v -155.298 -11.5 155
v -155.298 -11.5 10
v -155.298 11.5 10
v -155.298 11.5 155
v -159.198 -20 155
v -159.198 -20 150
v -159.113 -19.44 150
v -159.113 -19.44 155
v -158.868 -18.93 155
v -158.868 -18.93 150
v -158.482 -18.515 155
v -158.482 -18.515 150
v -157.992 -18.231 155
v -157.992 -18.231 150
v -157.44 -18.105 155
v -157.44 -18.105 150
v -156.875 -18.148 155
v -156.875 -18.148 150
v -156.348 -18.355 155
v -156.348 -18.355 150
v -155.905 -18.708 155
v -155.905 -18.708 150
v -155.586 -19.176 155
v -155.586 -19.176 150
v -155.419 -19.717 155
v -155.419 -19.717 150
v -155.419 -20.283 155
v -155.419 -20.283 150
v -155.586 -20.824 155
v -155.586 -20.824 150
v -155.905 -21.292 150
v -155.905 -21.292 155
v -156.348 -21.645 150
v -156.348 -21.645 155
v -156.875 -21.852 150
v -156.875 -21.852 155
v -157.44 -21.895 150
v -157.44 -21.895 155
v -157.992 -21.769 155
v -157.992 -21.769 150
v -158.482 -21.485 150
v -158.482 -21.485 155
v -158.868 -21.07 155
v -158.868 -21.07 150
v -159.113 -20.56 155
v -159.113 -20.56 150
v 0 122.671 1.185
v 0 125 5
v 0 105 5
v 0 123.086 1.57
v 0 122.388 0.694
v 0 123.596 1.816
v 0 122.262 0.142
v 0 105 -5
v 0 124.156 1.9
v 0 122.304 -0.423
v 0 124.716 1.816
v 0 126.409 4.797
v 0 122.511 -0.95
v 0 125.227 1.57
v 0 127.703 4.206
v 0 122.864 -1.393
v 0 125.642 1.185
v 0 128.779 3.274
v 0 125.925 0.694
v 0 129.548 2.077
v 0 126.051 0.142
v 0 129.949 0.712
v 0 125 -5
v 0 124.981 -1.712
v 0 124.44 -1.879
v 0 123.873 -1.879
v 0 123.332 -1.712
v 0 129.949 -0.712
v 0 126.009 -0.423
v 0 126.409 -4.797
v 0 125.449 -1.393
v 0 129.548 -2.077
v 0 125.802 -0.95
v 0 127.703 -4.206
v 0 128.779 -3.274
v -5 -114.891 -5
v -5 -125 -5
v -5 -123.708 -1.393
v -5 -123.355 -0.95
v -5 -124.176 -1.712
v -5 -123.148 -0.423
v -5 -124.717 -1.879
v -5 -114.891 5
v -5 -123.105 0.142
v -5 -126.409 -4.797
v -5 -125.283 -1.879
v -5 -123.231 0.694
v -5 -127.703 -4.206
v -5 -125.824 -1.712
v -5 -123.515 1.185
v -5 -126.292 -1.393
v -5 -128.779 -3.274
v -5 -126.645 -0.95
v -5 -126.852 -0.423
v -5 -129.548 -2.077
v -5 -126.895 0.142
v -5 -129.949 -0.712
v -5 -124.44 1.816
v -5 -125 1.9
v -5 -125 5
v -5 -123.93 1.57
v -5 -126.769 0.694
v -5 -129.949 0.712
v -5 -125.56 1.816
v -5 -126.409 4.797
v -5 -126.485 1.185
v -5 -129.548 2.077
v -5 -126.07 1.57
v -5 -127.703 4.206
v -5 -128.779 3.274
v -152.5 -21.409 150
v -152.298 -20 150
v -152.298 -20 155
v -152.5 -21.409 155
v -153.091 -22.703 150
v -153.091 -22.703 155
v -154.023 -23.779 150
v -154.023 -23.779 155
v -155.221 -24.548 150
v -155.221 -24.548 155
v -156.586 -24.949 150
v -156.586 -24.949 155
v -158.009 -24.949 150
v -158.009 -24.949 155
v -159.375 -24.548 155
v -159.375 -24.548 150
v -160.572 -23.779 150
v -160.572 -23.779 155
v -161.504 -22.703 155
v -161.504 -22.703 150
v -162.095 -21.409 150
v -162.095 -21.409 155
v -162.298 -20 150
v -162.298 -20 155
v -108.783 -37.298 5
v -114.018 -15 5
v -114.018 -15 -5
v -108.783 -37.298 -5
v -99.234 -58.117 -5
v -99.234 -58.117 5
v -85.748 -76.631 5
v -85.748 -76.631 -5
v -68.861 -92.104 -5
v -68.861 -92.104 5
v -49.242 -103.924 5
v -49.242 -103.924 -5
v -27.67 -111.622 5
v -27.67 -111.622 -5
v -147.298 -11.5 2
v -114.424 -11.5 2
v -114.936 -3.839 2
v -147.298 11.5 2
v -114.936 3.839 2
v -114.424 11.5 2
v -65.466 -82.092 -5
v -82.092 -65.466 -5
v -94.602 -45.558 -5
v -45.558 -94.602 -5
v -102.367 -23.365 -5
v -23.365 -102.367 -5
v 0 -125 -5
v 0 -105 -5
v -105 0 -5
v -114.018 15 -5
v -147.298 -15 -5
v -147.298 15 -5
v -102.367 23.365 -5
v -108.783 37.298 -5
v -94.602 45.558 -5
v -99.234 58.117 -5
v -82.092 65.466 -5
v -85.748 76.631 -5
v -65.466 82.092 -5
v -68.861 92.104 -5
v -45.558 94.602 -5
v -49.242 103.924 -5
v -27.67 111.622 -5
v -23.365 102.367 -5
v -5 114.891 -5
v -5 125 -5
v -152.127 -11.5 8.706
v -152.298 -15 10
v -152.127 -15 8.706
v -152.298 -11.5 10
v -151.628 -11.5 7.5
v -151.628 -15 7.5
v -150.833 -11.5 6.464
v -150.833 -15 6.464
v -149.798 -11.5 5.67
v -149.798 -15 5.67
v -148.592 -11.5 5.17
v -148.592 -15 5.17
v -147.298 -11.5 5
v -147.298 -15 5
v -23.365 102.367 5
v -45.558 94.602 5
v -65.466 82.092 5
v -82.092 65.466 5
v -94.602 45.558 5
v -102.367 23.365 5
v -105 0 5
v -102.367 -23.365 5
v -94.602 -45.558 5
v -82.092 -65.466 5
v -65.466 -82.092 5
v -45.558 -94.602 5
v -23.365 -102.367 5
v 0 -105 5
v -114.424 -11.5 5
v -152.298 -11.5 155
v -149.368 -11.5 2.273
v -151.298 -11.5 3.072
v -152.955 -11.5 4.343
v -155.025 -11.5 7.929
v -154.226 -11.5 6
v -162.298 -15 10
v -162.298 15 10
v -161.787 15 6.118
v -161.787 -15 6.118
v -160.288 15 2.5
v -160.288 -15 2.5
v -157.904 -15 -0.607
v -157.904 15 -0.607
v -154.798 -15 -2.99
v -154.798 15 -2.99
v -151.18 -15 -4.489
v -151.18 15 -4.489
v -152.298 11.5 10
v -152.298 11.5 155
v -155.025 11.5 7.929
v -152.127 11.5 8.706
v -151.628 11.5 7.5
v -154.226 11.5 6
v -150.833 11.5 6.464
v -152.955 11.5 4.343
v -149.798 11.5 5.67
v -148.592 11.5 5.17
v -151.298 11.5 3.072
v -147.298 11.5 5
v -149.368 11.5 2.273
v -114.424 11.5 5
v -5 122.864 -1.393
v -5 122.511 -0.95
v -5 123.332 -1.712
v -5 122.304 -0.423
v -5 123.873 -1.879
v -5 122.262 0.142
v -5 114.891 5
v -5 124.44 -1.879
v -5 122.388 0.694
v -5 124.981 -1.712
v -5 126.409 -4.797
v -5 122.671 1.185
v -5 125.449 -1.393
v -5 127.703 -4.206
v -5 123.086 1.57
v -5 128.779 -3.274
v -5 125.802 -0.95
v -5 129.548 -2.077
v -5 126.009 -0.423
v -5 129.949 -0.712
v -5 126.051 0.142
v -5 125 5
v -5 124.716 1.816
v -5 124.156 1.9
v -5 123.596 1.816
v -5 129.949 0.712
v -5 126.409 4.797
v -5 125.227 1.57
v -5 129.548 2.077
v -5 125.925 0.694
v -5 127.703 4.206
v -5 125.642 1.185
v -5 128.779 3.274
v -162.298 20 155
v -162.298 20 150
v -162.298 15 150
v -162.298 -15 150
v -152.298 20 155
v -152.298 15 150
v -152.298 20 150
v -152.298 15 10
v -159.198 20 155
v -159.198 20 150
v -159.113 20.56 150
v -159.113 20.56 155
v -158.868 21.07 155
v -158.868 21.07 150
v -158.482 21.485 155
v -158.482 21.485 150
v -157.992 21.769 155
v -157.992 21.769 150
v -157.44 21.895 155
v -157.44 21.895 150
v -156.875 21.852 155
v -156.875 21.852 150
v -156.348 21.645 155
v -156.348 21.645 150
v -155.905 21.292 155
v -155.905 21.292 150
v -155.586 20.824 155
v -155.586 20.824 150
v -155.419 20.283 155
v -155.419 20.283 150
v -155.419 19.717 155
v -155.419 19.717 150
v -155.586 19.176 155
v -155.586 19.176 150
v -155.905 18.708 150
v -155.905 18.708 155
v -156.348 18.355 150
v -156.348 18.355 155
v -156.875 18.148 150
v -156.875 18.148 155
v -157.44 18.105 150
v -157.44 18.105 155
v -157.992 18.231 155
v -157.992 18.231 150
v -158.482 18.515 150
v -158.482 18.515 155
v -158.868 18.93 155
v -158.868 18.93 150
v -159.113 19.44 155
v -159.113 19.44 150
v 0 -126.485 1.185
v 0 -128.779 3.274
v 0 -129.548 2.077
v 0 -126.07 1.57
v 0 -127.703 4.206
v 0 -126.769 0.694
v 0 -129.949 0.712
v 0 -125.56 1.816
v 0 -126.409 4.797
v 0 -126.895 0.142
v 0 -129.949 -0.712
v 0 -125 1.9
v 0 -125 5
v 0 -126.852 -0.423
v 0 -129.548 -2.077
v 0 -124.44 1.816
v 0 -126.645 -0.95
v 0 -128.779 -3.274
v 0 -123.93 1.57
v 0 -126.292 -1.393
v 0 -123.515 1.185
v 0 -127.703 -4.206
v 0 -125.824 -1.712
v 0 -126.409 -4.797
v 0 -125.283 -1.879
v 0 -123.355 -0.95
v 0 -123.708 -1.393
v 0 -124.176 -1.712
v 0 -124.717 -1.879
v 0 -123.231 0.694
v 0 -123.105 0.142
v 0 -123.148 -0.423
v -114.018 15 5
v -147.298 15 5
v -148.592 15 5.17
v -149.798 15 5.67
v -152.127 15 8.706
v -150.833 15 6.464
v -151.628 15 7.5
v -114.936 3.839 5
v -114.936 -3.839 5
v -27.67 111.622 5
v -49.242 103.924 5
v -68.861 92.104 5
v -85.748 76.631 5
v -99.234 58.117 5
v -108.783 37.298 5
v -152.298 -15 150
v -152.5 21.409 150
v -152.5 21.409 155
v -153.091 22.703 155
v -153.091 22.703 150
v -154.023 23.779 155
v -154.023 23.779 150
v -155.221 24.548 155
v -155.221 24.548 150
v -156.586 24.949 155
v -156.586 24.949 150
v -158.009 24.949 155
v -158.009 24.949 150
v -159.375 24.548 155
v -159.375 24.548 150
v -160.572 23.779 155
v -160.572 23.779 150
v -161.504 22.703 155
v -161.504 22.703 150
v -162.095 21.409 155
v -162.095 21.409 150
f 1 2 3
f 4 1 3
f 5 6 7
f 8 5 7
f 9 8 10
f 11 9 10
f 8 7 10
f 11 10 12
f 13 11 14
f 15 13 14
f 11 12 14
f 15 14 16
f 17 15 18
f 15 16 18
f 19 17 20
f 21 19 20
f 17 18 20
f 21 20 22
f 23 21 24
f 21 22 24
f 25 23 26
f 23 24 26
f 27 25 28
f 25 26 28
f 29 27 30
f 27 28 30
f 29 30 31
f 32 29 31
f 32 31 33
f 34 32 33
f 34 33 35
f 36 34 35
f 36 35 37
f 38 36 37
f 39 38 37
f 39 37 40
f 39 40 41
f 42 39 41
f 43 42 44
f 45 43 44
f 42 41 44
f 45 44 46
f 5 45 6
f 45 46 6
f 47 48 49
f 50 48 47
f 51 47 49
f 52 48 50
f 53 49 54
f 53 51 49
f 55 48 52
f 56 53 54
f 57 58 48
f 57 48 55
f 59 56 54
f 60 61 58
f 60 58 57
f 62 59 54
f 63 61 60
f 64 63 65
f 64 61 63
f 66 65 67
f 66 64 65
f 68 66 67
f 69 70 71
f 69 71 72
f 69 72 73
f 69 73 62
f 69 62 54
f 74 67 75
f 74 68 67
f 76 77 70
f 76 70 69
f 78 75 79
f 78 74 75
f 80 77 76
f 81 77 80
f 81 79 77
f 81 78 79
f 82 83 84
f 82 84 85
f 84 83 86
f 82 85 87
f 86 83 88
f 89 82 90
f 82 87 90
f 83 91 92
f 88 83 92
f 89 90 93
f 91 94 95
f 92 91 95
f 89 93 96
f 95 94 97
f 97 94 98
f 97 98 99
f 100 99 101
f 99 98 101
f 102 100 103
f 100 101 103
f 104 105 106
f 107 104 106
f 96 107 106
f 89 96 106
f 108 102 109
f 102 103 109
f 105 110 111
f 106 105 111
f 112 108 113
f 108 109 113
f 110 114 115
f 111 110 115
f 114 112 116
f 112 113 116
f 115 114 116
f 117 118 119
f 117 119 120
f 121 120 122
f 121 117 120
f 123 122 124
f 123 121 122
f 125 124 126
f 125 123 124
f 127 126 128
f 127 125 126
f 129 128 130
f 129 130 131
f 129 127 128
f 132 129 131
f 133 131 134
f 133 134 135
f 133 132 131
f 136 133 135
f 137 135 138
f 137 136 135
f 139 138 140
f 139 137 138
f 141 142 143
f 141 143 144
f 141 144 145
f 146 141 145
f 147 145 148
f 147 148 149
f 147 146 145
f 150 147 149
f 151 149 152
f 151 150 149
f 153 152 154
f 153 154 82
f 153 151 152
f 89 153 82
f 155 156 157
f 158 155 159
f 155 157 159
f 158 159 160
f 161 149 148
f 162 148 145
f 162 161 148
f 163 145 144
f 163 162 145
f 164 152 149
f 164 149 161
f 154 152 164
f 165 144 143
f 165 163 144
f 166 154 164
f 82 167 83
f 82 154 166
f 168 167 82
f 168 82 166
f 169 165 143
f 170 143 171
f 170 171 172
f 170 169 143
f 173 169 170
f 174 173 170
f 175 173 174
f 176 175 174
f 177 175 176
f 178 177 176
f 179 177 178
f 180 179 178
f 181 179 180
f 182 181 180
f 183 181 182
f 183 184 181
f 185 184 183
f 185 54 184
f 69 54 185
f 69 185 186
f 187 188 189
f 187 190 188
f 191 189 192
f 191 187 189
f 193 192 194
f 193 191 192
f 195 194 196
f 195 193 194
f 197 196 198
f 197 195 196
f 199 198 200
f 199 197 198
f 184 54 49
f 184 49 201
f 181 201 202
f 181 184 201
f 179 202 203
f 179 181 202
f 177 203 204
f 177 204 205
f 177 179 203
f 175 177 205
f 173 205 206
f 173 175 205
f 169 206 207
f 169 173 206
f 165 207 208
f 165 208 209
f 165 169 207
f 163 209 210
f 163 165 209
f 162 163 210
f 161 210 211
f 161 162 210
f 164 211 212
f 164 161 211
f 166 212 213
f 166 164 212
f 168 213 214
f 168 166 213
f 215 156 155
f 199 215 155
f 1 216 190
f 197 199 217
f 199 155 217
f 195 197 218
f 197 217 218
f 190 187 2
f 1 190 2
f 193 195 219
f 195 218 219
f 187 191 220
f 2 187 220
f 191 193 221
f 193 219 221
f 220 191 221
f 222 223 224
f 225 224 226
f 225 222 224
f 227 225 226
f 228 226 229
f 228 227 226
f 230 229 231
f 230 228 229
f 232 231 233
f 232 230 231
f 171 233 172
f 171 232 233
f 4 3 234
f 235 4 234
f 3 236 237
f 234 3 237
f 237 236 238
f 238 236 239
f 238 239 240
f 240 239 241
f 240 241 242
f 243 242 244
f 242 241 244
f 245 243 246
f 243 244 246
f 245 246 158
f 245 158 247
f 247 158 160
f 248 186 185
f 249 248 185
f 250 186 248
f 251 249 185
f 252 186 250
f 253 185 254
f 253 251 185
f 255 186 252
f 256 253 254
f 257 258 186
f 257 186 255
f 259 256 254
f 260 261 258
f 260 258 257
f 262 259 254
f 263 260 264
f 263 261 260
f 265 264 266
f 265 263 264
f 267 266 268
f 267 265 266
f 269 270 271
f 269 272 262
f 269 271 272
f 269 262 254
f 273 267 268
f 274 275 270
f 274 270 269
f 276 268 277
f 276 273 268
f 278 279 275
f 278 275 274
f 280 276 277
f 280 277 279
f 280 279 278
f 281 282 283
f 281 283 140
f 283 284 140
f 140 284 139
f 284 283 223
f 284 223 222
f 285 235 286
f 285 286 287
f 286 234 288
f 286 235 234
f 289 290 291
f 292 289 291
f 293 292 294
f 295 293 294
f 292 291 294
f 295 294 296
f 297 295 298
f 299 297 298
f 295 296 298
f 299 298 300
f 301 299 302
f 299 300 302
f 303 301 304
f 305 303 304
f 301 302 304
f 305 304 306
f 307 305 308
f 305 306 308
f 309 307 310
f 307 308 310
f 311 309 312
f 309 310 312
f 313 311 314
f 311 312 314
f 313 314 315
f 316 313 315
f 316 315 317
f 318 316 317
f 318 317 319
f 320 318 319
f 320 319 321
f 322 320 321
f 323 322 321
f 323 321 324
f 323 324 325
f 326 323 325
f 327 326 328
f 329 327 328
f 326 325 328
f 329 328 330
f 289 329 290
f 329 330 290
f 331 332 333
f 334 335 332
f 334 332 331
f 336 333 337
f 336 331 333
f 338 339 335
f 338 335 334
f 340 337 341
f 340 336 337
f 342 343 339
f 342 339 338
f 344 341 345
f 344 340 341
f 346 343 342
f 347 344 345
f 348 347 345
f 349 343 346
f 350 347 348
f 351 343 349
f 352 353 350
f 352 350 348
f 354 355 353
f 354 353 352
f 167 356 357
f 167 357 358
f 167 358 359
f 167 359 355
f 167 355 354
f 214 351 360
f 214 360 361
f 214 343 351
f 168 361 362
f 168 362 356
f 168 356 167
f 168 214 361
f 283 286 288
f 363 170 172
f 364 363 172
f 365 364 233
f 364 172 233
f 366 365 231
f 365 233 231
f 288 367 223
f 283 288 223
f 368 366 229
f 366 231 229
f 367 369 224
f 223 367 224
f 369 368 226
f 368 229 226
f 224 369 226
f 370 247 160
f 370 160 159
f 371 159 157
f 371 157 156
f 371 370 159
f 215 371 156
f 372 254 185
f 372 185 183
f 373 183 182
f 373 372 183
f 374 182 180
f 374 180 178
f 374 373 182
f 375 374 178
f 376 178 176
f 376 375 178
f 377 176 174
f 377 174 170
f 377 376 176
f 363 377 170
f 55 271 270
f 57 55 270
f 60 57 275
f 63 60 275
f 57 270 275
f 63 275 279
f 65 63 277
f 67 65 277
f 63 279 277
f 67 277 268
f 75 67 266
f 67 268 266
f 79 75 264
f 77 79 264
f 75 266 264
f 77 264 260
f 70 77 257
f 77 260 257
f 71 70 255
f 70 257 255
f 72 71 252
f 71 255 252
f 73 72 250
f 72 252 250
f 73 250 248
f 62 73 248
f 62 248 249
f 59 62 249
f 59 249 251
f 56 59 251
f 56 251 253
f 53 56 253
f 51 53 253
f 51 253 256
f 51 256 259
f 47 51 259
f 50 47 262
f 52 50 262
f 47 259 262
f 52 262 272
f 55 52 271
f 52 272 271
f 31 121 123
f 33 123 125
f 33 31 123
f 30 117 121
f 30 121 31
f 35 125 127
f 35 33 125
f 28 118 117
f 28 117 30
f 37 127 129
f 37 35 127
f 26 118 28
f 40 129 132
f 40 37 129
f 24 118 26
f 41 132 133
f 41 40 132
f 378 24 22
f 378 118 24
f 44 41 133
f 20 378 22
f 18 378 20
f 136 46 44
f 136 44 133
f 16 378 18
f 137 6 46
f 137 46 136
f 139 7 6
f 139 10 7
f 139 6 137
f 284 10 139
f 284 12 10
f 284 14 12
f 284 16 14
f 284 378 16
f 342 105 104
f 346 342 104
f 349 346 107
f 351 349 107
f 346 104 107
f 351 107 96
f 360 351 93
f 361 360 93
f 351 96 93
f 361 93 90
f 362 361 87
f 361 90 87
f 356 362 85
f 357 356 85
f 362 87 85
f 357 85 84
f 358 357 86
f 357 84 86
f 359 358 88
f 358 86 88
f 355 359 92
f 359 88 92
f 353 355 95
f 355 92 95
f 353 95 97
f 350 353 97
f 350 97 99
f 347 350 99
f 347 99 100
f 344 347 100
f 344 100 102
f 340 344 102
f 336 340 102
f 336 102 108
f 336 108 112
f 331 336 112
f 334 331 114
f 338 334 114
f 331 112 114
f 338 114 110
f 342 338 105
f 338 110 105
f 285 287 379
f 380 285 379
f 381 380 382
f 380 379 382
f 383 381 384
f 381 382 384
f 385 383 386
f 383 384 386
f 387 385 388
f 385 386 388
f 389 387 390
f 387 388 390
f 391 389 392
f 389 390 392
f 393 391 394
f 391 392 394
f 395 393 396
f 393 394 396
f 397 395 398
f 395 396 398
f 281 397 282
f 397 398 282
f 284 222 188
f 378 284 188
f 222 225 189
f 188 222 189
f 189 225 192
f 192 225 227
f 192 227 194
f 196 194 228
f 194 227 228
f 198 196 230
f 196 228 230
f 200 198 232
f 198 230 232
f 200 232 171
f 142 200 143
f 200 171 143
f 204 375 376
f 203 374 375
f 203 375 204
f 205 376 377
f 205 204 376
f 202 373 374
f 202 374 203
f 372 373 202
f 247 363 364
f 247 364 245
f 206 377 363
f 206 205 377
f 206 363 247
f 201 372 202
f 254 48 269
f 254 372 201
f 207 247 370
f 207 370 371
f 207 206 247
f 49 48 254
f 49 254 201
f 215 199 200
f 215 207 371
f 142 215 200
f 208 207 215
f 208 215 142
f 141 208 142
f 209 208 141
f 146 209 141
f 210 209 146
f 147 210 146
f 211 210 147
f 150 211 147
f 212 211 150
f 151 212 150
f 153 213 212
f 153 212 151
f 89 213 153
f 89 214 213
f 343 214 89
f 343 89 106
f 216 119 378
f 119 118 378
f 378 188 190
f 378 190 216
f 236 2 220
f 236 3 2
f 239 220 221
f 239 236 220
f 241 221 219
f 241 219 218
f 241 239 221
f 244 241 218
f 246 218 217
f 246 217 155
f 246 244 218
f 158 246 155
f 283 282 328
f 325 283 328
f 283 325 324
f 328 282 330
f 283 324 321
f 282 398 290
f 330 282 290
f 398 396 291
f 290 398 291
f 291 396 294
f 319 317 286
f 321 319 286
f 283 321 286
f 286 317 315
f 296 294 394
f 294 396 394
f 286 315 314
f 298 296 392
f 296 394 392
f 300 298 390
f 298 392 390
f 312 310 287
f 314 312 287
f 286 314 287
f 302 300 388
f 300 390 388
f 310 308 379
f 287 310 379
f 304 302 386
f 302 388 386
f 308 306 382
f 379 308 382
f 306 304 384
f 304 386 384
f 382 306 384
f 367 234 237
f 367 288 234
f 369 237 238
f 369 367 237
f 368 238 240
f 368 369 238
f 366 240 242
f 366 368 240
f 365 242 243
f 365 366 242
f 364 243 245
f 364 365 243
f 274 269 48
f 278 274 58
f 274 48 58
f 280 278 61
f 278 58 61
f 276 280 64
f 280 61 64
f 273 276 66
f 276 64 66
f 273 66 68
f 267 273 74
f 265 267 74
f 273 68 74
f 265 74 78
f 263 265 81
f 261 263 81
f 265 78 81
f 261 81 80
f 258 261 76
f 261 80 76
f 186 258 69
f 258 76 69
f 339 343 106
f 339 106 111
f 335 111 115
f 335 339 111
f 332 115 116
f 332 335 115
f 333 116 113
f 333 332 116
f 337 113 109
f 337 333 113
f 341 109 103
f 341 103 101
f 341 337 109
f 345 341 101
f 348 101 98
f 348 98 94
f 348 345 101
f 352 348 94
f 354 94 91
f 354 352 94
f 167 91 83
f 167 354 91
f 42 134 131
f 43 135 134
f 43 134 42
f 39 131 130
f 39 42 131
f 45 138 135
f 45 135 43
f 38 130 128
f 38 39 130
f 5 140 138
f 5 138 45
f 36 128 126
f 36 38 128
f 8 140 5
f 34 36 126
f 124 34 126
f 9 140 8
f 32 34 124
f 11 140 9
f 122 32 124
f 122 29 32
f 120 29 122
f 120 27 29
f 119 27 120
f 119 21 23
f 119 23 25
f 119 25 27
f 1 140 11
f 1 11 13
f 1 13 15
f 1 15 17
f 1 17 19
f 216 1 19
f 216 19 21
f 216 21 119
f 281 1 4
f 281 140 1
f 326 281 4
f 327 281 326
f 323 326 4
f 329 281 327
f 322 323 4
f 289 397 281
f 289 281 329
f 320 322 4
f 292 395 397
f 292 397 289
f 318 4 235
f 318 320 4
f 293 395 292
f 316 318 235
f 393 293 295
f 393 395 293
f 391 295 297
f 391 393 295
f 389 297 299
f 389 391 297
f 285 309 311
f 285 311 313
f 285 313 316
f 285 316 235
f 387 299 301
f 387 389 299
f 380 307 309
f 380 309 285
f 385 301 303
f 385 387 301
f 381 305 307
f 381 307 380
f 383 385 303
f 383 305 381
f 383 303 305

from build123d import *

# Parameters (mm, degrees)
SKETCH_1_R                = 115
SKETCH_1_R_2              = 105
EXTRUDE_1_DEPTH           = 5
SKETCH_4_R                = 2.5
CUT_EXTRUDE_1_DEPTH       = 33.934862746
EXTRUDE_2_DEPTH           = 5
HOLE_WIZARD_1_D           = 4.5
HOLE_WIZARD_1_CBORE_D     = 6
HOLE_WIZARD_1_CBORE_DEPTH = 3
SKETCH_9_R                = 2.25
SKETCH_9_R_2              = 1.9
EXTRUDE_3_DEPTH           = 5
EXTRUDE_4_DEPTH           = 5
HOLE_WIZARD_2_D           = 4.5
HOLE_WIZARD_2_CBORE_D     = 6
HOLE_WIZARD_2_CBORE_DEPTH = 3
SKETCH_13_R               = 2.25
SKETCH_13_R_2             = 1.9
EXTRUDE_5_DEPTH           = 5
SKETCH_14_W               = 562.038590931
SKETCH_14_H               = 462.09177453
CUT_EXTRUDE_4_DEPTH       = 163.29776757
SKETCH_15_W               = 637.223239982
SKETCH_15_H               = 375.31186697
CUT_EXTRUDE_5_DEPTH       = 202.710100717


with BuildPart() as part:
    # 草图1 → 凸台-拉伸1 (new body, symmetric)
    with BuildSketch(Plane.XY):
        Circle(SKETCH_1_R)
        Circle(SKETCH_1_R_2, mode=Mode.SUBTRACT)
    extrude(amount=EXTRUDE_1_DEPTH, both=True)

    # 扫描1: sweep along a path in 草图2
    with BuildLine(Plane(origin=(0, 0, 0), x_dir=(1, 0, 0), z_dir=(0, 1, 0))) as sweep_1_path:
        Line((-130, -355), (-156.694693778, -281.656931626))
        ThreePointArc((-156.694693778, -281.656931626), (-157.1458451, -279.97321197), (-157.29776757, -278.236730193))
        Line((-157.29776757, -278.236730193), (-157.29776757, -10))
        ThreePointArc((-157.29776757, -10), (-154.368835382, -2.928932188), (-147.29776757, 0))
        Line((-147.29776757, 0), (-115, 0))
        Line((-115, 0), (-106.681302201, 0))
    # 草图3 → 扫描1 (sweep)
    with BuildSketch(Plane(origin=(-130, 0, 355), x_dir=(0.939692621, 0, -0.342020143), z_dir=(0.342020143, 0, 0.939692621))):
        Polygon((-5, -15), (5, -15), (5, -11.5), (2, -11.5), (2, 11.5), (5, 11.5), (5, 15), (-5, 15), align=None)
    sweep_1 = sweep(path=sweep_1_path.line)

    # 草图4 → 切除-拉伸1 (cut, through all)
    with BuildSketch(Plane(origin=(-227.008304281, 0, 82.624265689), x_dir=(-0.342020143, 0, -0.939692621), z_dir=(0.939692621, 0, -0.342020143))):
        with Locations((-274.128261747, 6.75)):
            Circle(SKETCH_4_R)
        with Locations((-274.128261747, -6.75)):
            Circle(SKETCH_4_R)
    cut_extrude_1 = extrude(amount=-CUT_EXTRUDE_1_DEPTH, mode=Mode.SUBTRACT)

    # 镜向1: 扫描1, 切除-拉伸1 across plane
    add(sweep_1.mirror(Plane(origin=(0, 0, 0), x_dir=(0, 0, 1), z_dir=(1, 0, 0))))
    add(cut_extrude_1.mirror(Plane(origin=(0, 0, 0), x_dir=(0, 0, 1), z_dir=(1, 0, 0))), mode=Mode.SUBTRACT)

    # 草图6 → 凸台-拉伸2 (add, symmetric)
    with BuildSketch(Plane(origin=(0, 0, 0), x_dir=(0, 0, -1), z_dir=(1, 0, 0))):
        with BuildLine():
            Line((-5, 115), (-5, 125))
            ThreePointArc((-5, 125), (0, 130), (5, 125))
            Line((5, 125), (5, 115))
            Line((5, 115), (5, 112.136445143))
            Line((5, 112.136445143), (-5, 112.136445143))
            Line((-5, 112.136445143), (-5, 115))
        make_face()
    extrude_2 = extrude(amount=EXTRUDE_2_DEPTH, both=True)

    # 镜向2: 凸台-拉伸2 across plane
    add(extrude_2.mirror(Plane.ZX))

    # 孔1 (through all)
    with Locations(Plane(origin=(5, 0, 0), x_dir=(0, 0, -1), z_dir=(1, 0, 0))):
        with Locations((0, 124.156343107), (0, -125)):
            CounterBoreHole(HOLE_WIZARD_1_D / 2, HOLE_WIZARD_1_CBORE_D / 2, HOLE_WIZARD_1_CBORE_DEPTH)

    # 草图9 → 凸台-拉伸3 (add)
    with BuildSketch(Plane.ZY.offset(5)):
        with Locations((0, 124.156343107)):
            Circle(SKETCH_9_R)
        with Locations((0, 124.156343107)):
            Circle(SKETCH_9_R_2, mode=Mode.SUBTRACT)
        with Locations((0, -125)):
            Circle(SKETCH_9_R)
        with Locations((0, -125)):
            Circle(SKETCH_9_R_2, mode=Mode.SUBTRACT)
    extrude(amount=-EXTRUDE_3_DEPTH)

    # 草图10 → 凸台-拉伸4 (add, symmetric)
    with BuildSketch(Plane.XY.offset(155)):
        with BuildLine():
            Line((-162.29776757, 15), (-152.29776757, 15))
            Line((-152.29776757, 15), (-152.29776757, 20))
            ThreePointArc((-152.29776757, 20), (-157.29776757, 25), (-162.29776757, 20))
            Line((-162.29776757, 20), (-162.29776757, 15))
        make_face()
        with BuildLine():
            Line((-152.29776757, -15), (-152.29776757, -20))
            ThreePointArc((-152.29776757, -20), (-157.29776757, -25), (-162.29776757, -20))
            Line((-162.29776757, -20), (-162.29776757, -15))
            Line((-162.29776757, -15), (-152.29776757, -15))
        make_face()
        with BuildLine():
            Line((162.29776757, -15), (152.29776757, -15))
            Line((152.29776757, -15), (152.29776757, -20))
            ThreePointArc((152.29776757, -20), (157.29776757, -25), (162.29776757, -20))
            Line((162.29776757, -20), (162.29776757, -15))
        make_face()
        with BuildLine():
            Line((152.29776757, 15), (152.29776757, 20))
            ThreePointArc((152.29776757, 20), (157.29776757, 25), (162.29776757, 20))
            Line((162.29776757, 20), (162.29776757, 15))
            Line((162.29776757, 15), (152.29776757, 15))
        make_face()
    extrude(amount=EXTRUDE_4_DEPTH, both=True)

    # 孔2 (through all)
    with Locations(Plane.XY.offset(160)):
        with Locations((-157.29776757, 20), (-157.29776757, -20), (157.29776757, 20), (157.29776757, -20)):
            CounterBoreHole(HOLE_WIZARD_2_D / 2, HOLE_WIZARD_2_CBORE_D / 2, HOLE_WIZARD_2_CBORE_DEPTH)

    # 草图13 → 凸台-拉伸5 (add)
    with BuildSketch(Plane(origin=(0, 0, 150), x_dir=(-1, 0, 0), z_dir=(0, 0, -1))):
        with Locations((-157.29776757, 20)):
            Circle(SKETCH_13_R)
        with Locations((-157.29776757, 20)):
            Circle(SKETCH_13_R_2, mode=Mode.SUBTRACT)
        with Locations((-157.29776757, -20)):
            Circle(SKETCH_13_R)
        with Locations((-157.29776757, -20)):
            Circle(SKETCH_13_R_2, mode=Mode.SUBTRACT)
        with Locations((157.29776757, -20)):
            Circle(SKETCH_13_R)
        with Locations((157.29776757, -20)):
            Circle(SKETCH_13_R_2, mode=Mode.SUBTRACT)
        with Locations((157.29776757, 20)):
            Circle(SKETCH_13_R)
        with Locations((157.29776757, 20)):
            Circle(SKETCH_13_R_2, mode=Mode.SUBTRACT)
    extrude(amount=-EXTRUDE_5_DEPTH)

    # 草图14 → 切除-拉伸4 (cut, through all)
    with BuildSketch(Plane(origin=(0, 0, 0), x_dir=(0, 0, -1), z_dir=(1, 0, 0))):
        with Locations((-153.139864812, -31.152254463)):
            Rectangle(SKETCH_14_W, SKETCH_14_H)
    extrude(amount=CUT_EXTRUDE_4_DEPTH, mode=Mode.SUBTRACT)

    # 草图15 → 切除-拉伸5 (cut, through all)
    with BuildSketch(Plane.XY.offset(155)):
        Rectangle(SKETCH_15_W, SKETCH_15_H)
    extrude(amount=CUT_EXTRUDE_5_DEPTH, mode=Mode.SUBTRACT)


solid = part.part
